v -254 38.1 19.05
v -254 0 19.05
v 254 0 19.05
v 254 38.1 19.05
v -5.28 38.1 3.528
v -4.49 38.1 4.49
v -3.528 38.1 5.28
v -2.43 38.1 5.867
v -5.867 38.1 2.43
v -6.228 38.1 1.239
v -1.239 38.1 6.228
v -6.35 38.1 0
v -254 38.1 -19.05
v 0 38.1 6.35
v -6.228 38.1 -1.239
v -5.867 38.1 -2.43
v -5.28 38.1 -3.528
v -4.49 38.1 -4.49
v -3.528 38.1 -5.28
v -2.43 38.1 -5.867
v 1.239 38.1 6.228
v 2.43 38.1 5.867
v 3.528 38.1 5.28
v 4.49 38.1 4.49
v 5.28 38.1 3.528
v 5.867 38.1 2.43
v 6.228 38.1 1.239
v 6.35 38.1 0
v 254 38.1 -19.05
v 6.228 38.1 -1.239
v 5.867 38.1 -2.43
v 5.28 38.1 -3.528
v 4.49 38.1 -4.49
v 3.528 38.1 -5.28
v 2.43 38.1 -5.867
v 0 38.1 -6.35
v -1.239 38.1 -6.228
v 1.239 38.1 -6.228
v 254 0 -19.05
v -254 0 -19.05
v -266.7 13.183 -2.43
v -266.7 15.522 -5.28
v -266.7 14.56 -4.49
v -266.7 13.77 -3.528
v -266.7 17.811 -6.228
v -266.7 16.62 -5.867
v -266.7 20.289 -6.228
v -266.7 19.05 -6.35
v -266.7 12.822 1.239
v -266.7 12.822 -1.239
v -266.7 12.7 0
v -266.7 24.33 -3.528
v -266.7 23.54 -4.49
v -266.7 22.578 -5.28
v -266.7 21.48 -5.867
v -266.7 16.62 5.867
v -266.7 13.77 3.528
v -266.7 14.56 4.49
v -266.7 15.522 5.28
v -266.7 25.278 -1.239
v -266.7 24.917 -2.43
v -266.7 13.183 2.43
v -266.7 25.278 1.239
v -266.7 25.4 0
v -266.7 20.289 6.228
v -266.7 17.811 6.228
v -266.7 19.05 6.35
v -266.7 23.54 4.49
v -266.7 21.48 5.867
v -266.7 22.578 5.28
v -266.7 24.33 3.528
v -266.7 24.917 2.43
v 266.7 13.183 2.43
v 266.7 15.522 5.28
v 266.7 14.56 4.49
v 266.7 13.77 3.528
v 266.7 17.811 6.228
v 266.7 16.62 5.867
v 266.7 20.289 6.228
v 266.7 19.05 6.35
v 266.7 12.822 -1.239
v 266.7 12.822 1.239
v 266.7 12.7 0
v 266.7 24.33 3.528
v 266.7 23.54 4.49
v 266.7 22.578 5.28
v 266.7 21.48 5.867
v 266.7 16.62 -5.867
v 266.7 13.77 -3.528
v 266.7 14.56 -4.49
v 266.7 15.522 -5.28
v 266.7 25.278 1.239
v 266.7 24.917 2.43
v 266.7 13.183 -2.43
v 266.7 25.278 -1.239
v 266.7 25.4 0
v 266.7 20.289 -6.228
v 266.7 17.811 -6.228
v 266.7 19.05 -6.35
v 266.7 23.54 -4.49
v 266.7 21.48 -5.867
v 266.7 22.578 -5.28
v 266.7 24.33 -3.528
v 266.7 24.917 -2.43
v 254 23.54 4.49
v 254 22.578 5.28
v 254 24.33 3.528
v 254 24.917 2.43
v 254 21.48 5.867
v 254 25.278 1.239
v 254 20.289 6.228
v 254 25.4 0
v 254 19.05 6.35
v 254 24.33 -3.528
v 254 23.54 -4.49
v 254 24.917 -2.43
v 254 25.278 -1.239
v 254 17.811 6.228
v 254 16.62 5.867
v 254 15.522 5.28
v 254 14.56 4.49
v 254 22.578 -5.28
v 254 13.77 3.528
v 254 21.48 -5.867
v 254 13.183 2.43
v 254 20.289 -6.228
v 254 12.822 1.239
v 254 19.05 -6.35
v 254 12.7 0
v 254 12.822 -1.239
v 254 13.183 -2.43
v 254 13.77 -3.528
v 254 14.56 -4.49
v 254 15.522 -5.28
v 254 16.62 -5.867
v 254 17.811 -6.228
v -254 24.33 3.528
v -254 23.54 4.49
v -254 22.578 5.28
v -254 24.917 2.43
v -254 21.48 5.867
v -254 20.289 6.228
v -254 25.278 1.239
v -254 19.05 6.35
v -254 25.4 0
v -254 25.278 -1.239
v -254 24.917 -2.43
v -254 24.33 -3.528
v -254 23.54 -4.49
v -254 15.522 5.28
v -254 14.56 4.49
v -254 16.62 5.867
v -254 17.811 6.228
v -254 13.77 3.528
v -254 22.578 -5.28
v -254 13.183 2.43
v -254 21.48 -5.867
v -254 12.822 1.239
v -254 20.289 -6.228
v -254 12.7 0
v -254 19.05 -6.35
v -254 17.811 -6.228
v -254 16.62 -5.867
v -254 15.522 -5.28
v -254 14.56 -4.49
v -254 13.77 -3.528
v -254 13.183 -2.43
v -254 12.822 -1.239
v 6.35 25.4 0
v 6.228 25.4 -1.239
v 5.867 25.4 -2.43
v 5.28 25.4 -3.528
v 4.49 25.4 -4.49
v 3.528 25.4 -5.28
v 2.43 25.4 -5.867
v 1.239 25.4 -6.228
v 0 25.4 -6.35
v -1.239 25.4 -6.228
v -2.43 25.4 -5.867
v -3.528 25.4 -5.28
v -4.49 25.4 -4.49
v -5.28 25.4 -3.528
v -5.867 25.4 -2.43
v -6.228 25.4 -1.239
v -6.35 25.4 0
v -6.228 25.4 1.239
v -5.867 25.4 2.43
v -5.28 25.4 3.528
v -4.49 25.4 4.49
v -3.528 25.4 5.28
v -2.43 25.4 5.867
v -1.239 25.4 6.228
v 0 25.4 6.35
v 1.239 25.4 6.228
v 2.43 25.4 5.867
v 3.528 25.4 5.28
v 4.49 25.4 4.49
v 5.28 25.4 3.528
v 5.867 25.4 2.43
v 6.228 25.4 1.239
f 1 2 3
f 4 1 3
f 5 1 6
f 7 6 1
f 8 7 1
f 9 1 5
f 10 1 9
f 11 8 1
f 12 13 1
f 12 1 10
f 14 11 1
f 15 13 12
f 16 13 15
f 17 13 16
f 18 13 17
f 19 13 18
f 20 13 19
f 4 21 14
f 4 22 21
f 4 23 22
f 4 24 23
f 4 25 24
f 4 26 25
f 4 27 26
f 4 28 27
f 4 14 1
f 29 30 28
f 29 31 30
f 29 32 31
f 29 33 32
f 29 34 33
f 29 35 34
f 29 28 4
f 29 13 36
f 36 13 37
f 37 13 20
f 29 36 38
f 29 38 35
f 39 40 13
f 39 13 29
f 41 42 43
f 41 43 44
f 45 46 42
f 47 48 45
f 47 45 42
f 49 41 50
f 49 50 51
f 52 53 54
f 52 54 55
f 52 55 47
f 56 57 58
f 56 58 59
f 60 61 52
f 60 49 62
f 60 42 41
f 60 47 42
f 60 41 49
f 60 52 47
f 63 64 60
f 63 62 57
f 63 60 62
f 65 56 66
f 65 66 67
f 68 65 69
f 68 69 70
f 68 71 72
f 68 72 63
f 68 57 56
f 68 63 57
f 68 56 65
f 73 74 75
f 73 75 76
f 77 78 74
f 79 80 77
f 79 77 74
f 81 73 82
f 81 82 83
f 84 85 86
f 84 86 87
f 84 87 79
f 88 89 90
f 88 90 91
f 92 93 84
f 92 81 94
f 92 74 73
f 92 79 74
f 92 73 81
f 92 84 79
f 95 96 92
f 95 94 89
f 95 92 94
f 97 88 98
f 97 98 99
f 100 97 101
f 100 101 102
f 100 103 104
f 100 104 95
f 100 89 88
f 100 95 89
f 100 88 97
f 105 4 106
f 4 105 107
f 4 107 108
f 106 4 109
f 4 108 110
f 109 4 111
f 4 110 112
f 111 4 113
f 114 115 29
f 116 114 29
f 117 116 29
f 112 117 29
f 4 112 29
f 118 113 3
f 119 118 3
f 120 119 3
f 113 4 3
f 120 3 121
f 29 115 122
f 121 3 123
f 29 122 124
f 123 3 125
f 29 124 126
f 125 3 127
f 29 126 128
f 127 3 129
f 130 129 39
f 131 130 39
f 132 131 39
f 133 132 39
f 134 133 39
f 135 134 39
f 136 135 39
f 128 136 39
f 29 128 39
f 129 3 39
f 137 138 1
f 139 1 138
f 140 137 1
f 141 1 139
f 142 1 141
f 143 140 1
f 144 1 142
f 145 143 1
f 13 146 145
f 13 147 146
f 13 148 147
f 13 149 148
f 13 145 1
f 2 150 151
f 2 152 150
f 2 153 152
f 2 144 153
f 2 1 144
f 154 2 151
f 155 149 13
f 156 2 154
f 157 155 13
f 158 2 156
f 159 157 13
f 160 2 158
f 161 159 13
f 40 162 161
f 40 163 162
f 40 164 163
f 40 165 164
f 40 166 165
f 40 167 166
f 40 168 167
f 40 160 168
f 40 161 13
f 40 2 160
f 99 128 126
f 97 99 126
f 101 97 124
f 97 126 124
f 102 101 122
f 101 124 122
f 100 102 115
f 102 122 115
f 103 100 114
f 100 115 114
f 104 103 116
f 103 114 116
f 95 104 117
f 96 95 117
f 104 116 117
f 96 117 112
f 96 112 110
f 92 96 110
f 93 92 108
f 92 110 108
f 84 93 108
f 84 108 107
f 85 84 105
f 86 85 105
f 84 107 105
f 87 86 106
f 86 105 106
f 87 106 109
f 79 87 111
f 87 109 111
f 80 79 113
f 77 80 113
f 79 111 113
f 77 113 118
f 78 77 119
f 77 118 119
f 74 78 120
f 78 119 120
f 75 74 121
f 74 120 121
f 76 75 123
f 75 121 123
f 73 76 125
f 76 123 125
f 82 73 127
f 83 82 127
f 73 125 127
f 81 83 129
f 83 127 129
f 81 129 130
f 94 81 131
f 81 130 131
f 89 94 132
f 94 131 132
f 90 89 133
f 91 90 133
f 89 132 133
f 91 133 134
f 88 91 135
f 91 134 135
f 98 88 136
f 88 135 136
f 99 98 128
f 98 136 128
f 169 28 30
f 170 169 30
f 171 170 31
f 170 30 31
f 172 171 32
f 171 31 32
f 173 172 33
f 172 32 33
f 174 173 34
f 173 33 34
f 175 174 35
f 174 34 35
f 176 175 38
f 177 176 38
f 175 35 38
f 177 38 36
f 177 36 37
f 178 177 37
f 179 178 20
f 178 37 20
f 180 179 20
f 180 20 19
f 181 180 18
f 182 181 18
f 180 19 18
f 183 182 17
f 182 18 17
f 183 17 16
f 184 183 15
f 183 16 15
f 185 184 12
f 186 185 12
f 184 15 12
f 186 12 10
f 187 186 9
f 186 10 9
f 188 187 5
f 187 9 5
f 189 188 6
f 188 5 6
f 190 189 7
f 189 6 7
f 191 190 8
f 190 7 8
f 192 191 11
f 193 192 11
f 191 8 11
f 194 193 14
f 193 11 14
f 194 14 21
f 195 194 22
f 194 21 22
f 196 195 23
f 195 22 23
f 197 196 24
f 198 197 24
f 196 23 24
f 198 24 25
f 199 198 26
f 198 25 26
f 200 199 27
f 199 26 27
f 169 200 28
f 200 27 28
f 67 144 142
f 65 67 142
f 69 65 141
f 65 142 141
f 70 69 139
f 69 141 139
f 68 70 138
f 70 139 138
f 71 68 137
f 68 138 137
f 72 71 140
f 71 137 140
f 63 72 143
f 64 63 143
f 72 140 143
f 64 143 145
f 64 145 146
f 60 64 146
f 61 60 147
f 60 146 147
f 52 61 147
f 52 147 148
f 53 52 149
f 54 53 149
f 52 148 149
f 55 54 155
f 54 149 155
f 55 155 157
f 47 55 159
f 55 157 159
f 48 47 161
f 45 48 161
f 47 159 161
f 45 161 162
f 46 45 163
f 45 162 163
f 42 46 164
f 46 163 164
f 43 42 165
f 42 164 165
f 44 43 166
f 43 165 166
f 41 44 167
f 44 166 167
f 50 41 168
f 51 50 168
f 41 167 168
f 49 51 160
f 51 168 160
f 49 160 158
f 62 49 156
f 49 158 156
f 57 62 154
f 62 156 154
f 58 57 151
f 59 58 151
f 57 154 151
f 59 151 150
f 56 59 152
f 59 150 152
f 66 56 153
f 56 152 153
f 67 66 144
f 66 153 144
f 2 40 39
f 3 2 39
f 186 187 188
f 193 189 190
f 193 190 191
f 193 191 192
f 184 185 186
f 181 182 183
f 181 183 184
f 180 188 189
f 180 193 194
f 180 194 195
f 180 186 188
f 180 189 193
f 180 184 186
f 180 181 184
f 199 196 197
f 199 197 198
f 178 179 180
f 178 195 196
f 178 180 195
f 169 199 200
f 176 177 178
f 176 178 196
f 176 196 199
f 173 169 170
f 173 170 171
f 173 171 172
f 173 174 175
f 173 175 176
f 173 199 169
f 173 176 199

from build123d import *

# Parameters (mm, degrees)
CROQUIS1_W              = 508
CROQUIS1_H              = 38.1
SALIENTE_EXTRUIR1_DEPTH = 38.1
CROQUIS2_R              = 6.35
SALIENTE_EXTRUIR2_DEPTH = 12.7
CROQUIS3_R              = 6.35
SALIENTE_EXTRUIR3_DEPTH = 12.7
CROQUIS4_R              = 6.35
CORTAR_EXTRUIR1_DEPTH   = 12.7


with BuildPart() as part:
    # Croquis1 → Saliente-Extruir1 (new body)
    with BuildSketch(Plane(origin=(0, 0, 0), x_dir=(1, 0, 0), z_dir=(0, 1, 0))):
        Rectangle(CROQUIS1_W, CROQUIS1_H)
    extrude(amount=SALIENTE_EXTRUIR1_DEPTH)

    # Croquis2 → Saliente-Extruir2 (add)
    with BuildSketch(Plane.ZY.offset(254)):
        with Locations((0, 19.05)):
            Circle(CROQUIS2_R)
    extrude(amount=SALIENTE_EXTRUIR2_DEPTH)

    # Croquis3 → Saliente-Extruir3 (add)
    with BuildSketch(Plane(origin=(254, 0, 0), x_dir=(0, 0, -1), z_dir=(1, 0, 0))):
        with Locations((0, 19.05)):
            Circle(CROQUIS3_R)
    extrude(amount=SALIENTE_EXTRUIR3_DEPTH)

    # Croquis4 → Cortar-Extruir1 (cut)
    with BuildSketch(Plane(origin=(0, 38.1, 0), x_dir=(1, 0, 0), z_dir=(0, 1, 0))):
        Circle(CROQUIS4_R)
    extrude(amount=-CORTAR_EXTRUIR1_DEPTH, mode=Mode.SUBTRACT)


solid = part.part
